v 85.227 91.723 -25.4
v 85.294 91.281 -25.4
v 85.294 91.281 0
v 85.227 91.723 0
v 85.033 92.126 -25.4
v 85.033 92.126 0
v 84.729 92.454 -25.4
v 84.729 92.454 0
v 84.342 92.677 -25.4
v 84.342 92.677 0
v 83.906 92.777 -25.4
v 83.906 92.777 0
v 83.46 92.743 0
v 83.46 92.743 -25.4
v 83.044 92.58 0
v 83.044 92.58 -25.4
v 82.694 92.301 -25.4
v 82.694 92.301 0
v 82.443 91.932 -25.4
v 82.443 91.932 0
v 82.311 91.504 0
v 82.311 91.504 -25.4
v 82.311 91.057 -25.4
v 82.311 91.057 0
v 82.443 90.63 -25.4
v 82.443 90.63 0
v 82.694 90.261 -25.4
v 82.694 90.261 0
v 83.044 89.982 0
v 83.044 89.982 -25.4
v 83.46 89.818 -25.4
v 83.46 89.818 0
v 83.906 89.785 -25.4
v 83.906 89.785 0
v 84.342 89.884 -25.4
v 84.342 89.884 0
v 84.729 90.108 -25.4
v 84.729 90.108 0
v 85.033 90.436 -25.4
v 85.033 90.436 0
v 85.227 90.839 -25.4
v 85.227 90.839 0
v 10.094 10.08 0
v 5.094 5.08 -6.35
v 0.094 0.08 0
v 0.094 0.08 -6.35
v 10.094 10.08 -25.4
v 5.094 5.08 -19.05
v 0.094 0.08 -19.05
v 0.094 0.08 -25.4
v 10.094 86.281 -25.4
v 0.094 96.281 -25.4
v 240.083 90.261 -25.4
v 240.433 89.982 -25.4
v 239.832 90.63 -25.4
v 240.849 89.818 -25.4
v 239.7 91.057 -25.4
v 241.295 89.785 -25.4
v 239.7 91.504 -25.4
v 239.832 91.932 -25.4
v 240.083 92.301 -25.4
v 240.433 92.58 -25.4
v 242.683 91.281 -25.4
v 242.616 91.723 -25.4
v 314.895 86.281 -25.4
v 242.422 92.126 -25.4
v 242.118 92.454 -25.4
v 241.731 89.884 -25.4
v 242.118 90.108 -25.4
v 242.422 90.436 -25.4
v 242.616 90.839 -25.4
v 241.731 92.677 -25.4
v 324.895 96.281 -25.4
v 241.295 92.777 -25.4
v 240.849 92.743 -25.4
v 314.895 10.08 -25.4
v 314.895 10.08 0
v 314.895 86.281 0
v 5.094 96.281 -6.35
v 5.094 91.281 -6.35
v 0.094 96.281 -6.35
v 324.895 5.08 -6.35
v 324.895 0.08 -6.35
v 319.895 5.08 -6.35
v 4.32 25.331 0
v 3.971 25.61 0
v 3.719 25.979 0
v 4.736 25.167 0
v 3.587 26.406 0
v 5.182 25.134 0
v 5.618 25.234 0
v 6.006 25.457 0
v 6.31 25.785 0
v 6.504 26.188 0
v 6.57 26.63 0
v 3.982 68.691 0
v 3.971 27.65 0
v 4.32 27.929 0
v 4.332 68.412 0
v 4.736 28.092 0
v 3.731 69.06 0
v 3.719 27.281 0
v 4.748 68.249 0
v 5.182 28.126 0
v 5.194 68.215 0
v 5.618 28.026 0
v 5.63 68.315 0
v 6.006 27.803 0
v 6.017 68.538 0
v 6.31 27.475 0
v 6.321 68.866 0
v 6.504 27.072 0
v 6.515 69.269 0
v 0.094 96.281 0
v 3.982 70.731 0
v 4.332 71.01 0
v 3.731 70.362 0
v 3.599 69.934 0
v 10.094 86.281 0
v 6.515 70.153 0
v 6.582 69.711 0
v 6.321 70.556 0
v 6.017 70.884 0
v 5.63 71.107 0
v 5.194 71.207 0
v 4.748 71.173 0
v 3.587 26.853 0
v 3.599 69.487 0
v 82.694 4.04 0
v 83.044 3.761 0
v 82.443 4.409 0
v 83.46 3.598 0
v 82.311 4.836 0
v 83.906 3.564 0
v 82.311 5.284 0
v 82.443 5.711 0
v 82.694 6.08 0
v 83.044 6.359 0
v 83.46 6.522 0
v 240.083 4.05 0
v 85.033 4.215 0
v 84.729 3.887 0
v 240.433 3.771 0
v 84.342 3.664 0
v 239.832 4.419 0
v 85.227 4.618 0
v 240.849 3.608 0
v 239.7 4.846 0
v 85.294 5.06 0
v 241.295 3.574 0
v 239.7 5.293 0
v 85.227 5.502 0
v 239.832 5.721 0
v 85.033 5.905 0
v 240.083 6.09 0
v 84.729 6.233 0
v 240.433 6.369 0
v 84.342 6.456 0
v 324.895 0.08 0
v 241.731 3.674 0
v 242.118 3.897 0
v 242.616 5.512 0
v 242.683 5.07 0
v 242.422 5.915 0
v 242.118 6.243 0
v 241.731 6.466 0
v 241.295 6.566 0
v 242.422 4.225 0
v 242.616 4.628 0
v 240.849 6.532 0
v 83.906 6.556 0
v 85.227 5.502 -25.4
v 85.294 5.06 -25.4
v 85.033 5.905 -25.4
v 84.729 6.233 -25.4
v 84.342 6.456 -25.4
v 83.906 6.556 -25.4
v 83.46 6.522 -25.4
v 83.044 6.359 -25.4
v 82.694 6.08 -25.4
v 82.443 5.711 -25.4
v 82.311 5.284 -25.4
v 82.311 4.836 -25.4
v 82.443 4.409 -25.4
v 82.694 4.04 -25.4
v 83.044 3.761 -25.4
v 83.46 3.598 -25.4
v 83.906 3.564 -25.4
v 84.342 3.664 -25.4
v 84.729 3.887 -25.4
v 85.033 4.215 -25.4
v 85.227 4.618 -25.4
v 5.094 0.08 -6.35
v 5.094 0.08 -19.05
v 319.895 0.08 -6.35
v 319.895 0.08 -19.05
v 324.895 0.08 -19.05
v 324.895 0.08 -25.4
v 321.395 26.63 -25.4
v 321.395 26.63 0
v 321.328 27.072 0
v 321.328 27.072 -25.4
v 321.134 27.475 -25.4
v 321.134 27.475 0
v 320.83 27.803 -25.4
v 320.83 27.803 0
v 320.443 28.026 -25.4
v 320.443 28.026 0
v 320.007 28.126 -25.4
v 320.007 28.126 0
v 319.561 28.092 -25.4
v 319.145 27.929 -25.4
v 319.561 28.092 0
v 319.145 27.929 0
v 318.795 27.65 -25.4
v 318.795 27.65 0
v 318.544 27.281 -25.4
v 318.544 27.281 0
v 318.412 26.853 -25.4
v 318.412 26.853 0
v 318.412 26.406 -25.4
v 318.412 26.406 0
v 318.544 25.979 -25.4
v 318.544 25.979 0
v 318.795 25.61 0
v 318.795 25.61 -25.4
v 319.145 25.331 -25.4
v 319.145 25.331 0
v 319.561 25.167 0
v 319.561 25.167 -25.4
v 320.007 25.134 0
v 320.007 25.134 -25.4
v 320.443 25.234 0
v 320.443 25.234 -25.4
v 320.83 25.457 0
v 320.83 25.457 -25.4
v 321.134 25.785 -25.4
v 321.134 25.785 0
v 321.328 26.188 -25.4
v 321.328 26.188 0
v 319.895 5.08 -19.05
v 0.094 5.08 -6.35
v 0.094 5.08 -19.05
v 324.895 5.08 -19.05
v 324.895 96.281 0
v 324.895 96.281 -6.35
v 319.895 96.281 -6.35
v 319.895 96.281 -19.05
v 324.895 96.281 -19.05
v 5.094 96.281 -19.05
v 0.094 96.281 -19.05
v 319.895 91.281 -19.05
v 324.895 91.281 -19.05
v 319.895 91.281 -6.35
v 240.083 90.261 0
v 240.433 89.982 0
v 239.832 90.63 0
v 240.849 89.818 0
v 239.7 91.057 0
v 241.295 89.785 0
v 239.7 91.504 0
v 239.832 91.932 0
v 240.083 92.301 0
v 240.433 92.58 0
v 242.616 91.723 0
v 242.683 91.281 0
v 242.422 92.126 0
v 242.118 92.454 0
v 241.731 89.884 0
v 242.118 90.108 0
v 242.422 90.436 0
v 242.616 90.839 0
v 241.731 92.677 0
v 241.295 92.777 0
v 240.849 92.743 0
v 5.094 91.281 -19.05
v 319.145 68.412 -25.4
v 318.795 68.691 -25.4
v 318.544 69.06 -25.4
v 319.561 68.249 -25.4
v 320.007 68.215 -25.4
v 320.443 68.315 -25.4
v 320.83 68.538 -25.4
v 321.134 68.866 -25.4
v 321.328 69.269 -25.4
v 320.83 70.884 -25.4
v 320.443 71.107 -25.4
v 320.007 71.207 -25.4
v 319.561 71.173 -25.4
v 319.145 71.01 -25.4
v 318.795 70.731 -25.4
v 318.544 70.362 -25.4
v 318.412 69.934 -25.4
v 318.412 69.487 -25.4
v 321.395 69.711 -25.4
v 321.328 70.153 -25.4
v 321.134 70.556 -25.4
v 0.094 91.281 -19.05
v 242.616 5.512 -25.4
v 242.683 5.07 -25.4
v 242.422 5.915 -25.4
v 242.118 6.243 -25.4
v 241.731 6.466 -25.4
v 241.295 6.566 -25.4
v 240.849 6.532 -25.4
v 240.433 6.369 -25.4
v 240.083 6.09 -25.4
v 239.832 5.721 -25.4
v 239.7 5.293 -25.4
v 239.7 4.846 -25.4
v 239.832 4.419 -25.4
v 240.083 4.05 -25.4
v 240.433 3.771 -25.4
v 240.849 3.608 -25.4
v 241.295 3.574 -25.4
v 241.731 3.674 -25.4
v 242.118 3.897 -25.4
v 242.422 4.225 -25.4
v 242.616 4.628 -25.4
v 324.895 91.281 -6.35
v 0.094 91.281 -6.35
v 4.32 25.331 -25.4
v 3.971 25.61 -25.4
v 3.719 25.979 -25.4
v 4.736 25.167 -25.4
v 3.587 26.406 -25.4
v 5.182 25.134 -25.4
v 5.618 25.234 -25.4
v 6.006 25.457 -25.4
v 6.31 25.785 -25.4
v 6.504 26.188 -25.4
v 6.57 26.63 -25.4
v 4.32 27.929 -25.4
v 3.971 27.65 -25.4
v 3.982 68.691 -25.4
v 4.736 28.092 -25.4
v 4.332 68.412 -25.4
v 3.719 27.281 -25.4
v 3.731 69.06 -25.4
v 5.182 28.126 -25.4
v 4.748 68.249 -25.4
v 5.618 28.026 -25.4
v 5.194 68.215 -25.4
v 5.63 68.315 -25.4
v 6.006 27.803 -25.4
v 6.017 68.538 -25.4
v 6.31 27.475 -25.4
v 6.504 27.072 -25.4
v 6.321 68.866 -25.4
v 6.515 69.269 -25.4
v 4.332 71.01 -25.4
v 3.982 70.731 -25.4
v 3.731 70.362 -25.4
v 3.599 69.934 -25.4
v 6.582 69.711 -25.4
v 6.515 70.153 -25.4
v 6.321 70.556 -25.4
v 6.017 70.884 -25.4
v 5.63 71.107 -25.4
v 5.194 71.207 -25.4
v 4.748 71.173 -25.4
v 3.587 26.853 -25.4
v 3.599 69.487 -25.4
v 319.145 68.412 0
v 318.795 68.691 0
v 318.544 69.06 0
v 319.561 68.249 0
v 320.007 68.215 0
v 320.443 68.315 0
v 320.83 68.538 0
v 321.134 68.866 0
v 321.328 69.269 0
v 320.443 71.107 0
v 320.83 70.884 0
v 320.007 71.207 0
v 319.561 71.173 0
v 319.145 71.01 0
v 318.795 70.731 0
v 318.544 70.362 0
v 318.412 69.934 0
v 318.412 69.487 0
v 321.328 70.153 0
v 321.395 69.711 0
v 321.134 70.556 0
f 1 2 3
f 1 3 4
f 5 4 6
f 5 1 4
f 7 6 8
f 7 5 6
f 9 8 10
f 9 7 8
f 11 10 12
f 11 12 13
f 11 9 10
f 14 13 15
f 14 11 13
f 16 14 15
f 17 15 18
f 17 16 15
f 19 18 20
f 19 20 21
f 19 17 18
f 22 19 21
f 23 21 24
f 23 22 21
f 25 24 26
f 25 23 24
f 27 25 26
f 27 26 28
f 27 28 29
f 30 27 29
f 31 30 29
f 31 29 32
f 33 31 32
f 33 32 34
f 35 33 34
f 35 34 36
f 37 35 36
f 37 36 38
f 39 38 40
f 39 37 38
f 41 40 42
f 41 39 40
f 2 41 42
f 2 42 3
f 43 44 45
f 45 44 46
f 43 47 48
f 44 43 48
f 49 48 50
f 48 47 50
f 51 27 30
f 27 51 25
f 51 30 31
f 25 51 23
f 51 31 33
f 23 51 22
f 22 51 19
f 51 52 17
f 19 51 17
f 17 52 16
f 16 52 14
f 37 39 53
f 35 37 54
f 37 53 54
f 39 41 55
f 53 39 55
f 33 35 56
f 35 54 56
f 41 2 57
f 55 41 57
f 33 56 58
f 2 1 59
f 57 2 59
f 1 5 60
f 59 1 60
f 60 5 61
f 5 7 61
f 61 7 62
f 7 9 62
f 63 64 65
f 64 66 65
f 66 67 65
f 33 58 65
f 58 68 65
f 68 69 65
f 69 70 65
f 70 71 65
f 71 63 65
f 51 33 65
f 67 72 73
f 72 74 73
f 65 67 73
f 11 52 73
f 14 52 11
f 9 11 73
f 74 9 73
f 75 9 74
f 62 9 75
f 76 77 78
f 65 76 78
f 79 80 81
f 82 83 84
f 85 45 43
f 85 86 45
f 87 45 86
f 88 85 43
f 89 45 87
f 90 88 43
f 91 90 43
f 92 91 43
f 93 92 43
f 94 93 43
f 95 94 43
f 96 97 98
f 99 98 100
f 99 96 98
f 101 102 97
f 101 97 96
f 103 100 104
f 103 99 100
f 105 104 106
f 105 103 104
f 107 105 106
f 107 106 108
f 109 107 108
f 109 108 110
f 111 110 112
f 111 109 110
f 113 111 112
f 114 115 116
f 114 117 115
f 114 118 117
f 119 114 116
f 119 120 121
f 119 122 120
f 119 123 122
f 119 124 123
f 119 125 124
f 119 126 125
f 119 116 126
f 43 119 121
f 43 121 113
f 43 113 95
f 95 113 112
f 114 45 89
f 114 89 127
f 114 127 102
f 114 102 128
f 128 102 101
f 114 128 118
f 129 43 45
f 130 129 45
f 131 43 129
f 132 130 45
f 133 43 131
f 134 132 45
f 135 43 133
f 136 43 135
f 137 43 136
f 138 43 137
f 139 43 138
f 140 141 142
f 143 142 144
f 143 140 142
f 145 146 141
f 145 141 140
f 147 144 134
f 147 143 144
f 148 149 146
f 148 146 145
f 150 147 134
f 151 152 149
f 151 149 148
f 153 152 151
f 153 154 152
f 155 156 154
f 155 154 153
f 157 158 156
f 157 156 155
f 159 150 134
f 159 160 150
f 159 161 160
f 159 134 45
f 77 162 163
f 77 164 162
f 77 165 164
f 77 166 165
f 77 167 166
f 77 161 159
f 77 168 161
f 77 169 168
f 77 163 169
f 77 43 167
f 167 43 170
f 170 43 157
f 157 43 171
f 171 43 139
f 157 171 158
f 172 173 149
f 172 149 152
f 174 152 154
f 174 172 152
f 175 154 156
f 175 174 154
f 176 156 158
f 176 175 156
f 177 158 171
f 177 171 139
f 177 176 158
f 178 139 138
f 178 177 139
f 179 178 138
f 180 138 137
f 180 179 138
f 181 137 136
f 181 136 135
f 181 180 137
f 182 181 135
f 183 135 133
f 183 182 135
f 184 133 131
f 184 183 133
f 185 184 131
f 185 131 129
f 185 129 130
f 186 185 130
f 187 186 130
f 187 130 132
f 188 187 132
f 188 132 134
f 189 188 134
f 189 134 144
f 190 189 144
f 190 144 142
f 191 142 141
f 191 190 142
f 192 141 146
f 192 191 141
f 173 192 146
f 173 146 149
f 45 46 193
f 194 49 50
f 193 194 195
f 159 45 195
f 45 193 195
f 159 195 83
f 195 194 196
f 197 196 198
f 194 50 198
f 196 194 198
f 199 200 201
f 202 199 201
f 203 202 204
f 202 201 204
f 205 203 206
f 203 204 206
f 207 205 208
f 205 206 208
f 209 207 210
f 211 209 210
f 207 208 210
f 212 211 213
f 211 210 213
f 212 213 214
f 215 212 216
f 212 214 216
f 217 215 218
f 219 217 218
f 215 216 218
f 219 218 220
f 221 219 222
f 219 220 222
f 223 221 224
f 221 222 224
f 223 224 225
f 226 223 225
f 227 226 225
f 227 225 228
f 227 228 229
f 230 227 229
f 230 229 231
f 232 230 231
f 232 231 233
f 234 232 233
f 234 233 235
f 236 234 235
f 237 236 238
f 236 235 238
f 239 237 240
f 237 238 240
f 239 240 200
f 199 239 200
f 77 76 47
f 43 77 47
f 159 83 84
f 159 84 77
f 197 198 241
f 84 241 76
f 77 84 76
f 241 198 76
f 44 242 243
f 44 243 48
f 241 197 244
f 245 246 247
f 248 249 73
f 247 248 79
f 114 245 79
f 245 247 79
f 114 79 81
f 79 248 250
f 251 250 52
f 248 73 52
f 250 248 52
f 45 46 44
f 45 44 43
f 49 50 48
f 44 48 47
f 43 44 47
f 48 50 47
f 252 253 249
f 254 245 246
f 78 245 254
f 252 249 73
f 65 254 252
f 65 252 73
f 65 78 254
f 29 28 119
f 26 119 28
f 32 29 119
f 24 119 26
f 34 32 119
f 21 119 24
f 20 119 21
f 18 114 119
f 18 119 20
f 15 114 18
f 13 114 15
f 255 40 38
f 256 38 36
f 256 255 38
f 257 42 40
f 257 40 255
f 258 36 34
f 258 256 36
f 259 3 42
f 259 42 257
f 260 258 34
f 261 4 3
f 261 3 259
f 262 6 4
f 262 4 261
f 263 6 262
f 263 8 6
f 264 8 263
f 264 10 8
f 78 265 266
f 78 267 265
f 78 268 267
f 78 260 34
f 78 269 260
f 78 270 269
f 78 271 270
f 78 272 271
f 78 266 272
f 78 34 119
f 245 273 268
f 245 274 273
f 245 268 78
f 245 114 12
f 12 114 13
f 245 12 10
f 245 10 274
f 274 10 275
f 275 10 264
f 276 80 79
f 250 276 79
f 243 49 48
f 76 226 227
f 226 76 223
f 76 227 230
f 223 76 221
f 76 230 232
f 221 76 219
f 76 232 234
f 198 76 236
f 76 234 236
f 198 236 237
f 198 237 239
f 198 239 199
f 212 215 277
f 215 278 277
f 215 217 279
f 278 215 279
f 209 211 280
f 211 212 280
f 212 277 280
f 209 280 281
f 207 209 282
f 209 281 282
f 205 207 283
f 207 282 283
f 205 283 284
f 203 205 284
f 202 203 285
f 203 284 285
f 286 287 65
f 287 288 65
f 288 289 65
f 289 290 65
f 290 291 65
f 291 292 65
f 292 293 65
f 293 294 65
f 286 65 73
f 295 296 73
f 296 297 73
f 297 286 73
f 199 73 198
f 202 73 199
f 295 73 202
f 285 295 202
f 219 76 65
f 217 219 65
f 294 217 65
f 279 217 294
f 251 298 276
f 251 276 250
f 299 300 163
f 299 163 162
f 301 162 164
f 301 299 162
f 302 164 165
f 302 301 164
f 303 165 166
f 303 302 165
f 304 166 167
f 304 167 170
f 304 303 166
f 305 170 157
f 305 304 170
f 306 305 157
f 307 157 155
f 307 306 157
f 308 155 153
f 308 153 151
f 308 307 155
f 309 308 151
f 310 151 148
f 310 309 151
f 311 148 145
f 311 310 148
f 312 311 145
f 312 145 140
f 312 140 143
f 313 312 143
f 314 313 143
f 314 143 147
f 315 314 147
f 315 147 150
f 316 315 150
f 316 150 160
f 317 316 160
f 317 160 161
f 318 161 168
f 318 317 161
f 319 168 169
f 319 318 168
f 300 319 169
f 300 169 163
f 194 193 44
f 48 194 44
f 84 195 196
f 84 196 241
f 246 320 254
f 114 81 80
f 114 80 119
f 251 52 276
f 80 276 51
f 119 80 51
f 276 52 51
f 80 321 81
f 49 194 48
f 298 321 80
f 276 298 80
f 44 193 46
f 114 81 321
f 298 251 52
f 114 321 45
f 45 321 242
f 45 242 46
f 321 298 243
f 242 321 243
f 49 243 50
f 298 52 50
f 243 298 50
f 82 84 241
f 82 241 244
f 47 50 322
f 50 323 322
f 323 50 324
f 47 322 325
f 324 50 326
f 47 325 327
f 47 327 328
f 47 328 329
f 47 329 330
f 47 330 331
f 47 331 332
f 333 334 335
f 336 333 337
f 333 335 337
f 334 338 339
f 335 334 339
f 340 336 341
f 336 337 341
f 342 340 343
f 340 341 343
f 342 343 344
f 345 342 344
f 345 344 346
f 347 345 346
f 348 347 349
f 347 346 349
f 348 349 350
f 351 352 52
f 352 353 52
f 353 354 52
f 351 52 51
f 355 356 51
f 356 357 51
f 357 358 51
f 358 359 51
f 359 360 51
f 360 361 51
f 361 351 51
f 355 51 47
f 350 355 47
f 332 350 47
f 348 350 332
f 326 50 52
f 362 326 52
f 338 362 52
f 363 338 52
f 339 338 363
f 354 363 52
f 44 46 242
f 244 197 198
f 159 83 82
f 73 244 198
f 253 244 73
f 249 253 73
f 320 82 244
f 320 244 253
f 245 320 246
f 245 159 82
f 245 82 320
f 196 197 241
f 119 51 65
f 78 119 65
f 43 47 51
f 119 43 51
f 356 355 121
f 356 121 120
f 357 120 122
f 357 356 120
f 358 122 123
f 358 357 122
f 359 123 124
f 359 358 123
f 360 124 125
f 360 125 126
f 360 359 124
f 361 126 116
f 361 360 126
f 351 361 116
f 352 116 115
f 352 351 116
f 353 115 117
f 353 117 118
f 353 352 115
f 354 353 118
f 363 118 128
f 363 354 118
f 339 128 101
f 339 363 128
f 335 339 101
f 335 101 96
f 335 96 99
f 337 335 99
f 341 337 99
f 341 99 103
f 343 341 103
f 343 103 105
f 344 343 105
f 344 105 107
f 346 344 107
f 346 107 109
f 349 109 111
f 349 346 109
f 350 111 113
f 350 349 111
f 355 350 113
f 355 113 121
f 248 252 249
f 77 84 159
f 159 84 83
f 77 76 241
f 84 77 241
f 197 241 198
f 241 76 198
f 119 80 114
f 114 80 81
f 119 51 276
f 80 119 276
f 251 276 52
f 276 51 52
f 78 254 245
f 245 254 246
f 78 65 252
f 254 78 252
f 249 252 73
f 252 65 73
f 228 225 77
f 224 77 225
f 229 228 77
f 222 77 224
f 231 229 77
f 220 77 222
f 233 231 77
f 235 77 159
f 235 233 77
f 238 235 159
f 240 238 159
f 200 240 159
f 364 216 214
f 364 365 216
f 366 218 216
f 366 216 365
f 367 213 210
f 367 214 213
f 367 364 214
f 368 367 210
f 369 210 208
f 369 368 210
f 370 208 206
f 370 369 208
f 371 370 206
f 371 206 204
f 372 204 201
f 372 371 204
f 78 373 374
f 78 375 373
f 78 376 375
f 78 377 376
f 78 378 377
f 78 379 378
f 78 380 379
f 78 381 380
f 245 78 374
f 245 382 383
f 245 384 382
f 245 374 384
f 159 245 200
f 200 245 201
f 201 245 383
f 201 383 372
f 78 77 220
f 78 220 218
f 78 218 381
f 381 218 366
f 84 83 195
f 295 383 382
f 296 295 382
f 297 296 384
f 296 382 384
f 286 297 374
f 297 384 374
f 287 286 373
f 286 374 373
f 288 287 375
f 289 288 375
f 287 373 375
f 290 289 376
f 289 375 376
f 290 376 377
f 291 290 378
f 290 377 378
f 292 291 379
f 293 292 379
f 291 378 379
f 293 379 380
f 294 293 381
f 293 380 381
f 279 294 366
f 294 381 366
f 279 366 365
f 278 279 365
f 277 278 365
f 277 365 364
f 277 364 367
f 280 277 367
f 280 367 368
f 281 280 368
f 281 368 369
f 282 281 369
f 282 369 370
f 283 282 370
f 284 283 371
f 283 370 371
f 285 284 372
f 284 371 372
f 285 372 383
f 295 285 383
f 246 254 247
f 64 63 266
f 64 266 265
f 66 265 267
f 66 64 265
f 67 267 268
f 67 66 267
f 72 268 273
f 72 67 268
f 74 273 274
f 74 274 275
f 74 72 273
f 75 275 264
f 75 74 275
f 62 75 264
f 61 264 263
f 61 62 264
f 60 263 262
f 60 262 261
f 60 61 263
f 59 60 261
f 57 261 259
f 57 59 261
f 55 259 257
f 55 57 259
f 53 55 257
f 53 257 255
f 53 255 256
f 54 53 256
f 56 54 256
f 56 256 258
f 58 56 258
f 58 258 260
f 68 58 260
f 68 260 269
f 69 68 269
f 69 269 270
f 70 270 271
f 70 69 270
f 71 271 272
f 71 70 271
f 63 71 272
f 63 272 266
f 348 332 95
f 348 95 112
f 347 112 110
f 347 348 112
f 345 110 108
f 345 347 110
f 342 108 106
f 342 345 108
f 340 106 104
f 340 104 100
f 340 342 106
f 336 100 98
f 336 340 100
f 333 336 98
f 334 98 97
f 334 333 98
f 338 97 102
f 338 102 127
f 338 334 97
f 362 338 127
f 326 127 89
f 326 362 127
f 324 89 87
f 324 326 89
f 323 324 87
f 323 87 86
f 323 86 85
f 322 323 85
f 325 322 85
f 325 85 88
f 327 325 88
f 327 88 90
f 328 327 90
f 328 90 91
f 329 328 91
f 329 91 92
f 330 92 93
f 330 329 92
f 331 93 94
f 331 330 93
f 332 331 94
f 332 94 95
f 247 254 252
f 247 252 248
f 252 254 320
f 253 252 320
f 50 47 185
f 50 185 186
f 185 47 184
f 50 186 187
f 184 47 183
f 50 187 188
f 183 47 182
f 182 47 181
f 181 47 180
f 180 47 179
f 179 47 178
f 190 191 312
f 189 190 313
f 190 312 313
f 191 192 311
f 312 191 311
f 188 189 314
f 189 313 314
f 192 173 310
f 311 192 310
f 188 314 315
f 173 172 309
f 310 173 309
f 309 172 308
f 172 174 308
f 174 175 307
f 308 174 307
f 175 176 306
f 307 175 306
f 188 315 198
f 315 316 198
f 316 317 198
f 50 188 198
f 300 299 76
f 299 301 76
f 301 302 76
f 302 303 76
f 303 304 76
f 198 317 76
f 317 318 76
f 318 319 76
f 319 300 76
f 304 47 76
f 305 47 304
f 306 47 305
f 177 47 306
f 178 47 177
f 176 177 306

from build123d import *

# Parameters (mm, degrees)
SKETCH1_W               = 324.8012934
SKETCH1_H               = 96.2008736
SKETCH1_W_2             = 304.8012934
SKETCH1_H_2             = 76.2008736
BOSS_EXTRUDE1_DEPTH     = 25.4
SKETCH2_R               = 1.5
CUT_EXTRUDE1_DEPTH      = 25.4
SPLIT1_START            = -1
SPLIT1_OUTLINE_W        = 231.654651096
SPLIT1_OUTLINE_H        = 25.4
SPLIT1_DEPTH            = 300
SPLIT1_START_2          = 122.296599373
SPLIT1_2_OUTLINE_W      = 69.345348904
SPLIT1_2_OUTLINE_H      = 25.4
SPLIT1_2_DEPTH          = 107.4953748
SPLIT1_START_3          = -25.4
SPLIT1_3_OUTLINE_R      = 1.5
SPLIT1_3_DEPTH          = 25.4
SPLIT1_4_OUTLINE_R      = 1.5
SPLIT1_4_DEPTH          = 25.4
SPLIT1_5_DEPTH          = 25.4
SPLIT1_6_OUTLINE_R      = 1.5
SPLIT1_6_DEPTH          = 25.4
SPLIT1_7_OUTLINE_R      = 1.5
SPLIT1_7_DEPTH          = 25.4
SPLIT1_8_DEPTH          = 25.4
SPLIT1_9_OUTLINE_R      = 1.5
SPLIT1_9_DEPTH          = 25.4
CUT_EXTRUDE2_DEPTH      = 6.35
CUT_EXTRUDE2_DEPTH_BACK = 6.35
SKETCH5_W               = 5
SKETCH5_H               = 5


with BuildPart() as part:
    # Sketch1 → Boss-Extrude1 (new body)
    with BuildSketch(Plane.XY):
        with Locations((162.4943533, 48.1803632)):
            Rectangle(SKETCH1_W, SKETCH1_H)
        with Locations((162.4943533, 48.1803632)):
            Rectangle(SKETCH1_W_2, SKETCH1_H_2, mode=Mode.SUBTRACT)
    extrude(amount=-BOSS_EXTRUDE1_DEPTH)

    # Sketch2 → Cut-Extrude1 (cut)
    with BuildSketch(Plane.XY):
        with Locations((83.79402995, 91.2808)):
            Circle(SKETCH2_R)
        with Locations((241.182963325, 91.2808)):
            Circle(SKETCH2_R)
        with Locations((319.895, 69.710908993)):
            Circle(SKETCH2_R)
        with Locations((319.895, 26.629837247)):
            Circle(SKETCH2_R)
        with Locations((241.182963325, 5.0699356)):
            Circle(SKETCH2_R)
        with Locations((83.79402995, 5.0599448)):
            Circle(SKETCH2_R)
        with Locations((5.07026943, 26.629837247)):
            Circle(SKETCH2_R)
        with Locations((5.081988015, 69.710908993)):
            Circle(SKETCH2_R)
    extrude(amount=-CUT_EXTRUDE1_DEPTH, mode=Mode.SUBTRACT)

    # Split1: read off the stored shape, not the designer's step
    # Split1 outline → Split1 (cut)
    with BuildSketch(Plane(origin=(0, 0, 0), x_dir=(0.707106781186548, -0.707106781186547, 0), z_dir=(0.707106781186547, 0.707106781186548, 0)).offset(SPLIT1_START)):
        with Locations((45.827325548, 12.7)):
            Rectangle(SPLIT1_OUTLINE_W, SPLIT1_OUTLINE_H)
    extrude(amount=SPLIT1_DEPTH, mode=Mode.SUBTRACT)

    # Split1 2 outline → Split1 2 (cut)
    with BuildSketch(Plane(origin=(0, 0, 0), x_dir=(0.707106781186548, -0.707106781186547, 0), z_dir=(0.707106781186547, 0.707106781186548, 0)).offset(SPLIT1_START_2)):
        with Locations((196.327325548, 12.7)):
            Rectangle(SPLIT1_2_OUTLINE_W, SPLIT1_2_OUTLINE_H)
    extrude(amount=SPLIT1_2_DEPTH, mode=Mode.SUBTRACT)


with BuildPart() as body_2:
    # Split1 3 outline → Split1 3 (new body)
    with BuildSketch(Plane.XY.offset(SPLIT1_START_3)):
        Polygon((0.0937066, 0.0799264), (10.0937066, 10.0799264), (10.0937066, 86.2808), (0.0937066, 96.2808), align=None)
        with Locations((5.07026943, 26.629837247)):
            Circle(SPLIT1_3_OUTLINE_R, mode=Mode.SUBTRACT)
        with Locations((5.081988015, 69.710908993)):
            Circle(SPLIT1_3_OUTLINE_R, mode=Mode.SUBTRACT)
    extrude(amount=SPLIT1_3_DEPTH)


with BuildPart() as body_3:
    # Split1 4 outline → Split1 4 (new body)
    with BuildSketch(Plane.XY.offset(SPLIT1_START_3)):
        Polygon((324.895, 0.0799264), (314.895, 10.0799264), (238.6941264, 10.0799264), (228.6941264, 0.0799264), align=None)
        with Locations((241.182963325, 5.0699356)):
            Circle(SPLIT1_4_OUTLINE_R, mode=Mode.SUBTRACT)
    extrude(amount=SPLIT1_4_DEPTH)


with BuildPart() as body_4:
    # Split1 5 outline → Split1 5 (new body)
    with BuildSketch(Plane.XY.offset(SPLIT1_START_3)):
        Polygon((228.6941264, 0.0799264), (238.6941264, 10.0799264), (86.2945802, 10.0799264), (96.2945802, 0.0799264), align=None)
    extrude(amount=SPLIT1_5_DEPTH)


with BuildPart() as body_5:
    # Split1 6 outline → Split1 6 (new body)
    with BuildSketch(Plane.XY.offset(SPLIT1_START_3)):
        Polygon((96.2945802, 0.0799264), (86.2945802, 10.0799264), (10.0937066, 10.0799264), (0.0937066, 0.0799264), align=None)
        with Locations((83.79402995, 5.0599448)):
            Circle(SPLIT1_6_OUTLINE_R, mode=Mode.SUBTRACT)
    extrude(amount=SPLIT1_6_DEPTH)


with BuildPart() as body_6:
    # Split1 7 outline → Split1 7 (new body)
    with BuildSketch(Plane.XY.offset(SPLIT1_START_3)):
        Polygon((314.895, 86.2808), (324.895, 96.2808), (228.6941264, 96.2808), (238.6941264, 86.2808), align=None)
        with Locations((241.182963325, 91.2808)):
            Circle(SPLIT1_7_OUTLINE_R, mode=Mode.SUBTRACT)
    extrude(amount=SPLIT1_7_DEPTH)


with BuildPart() as body_7:
    # Split1 8 outline → Split1 8 (new body)
    with BuildSketch(Plane.XY.offset(SPLIT1_START_3)):
        Polygon((238.6941264, 86.2808), (228.6941264, 96.2808), (96.2945802, 96.2808), (86.2945802, 86.2808), align=None)
    extrude(amount=SPLIT1_8_DEPTH)


with BuildPart() as body_8:
    # Split1 9 outline → Split1 9 (new body)
    with BuildSketch(Plane.XY.offset(SPLIT1_START_3)):
        Polygon((86.2945802, 86.2808), (96.2945802, 96.2808), (0.0937066, 96.2808), (10.0937066, 86.2808), align=None)
        with Locations((83.79402995, 91.2808)):
            Circle(SPLIT1_9_OUTLINE_R, mode=Mode.SUBTRACT)
    extrude(amount=SPLIT1_9_DEPTH)

    # Combine1: union body 7, body 6
    add(body_7.part)
    add(body_6.part)


with BuildPart() as body_4_1:
    add(body_4.part)

    # Combine2: read off the stored shape, not the designer's step
    # Combine2: union body 3, body 5
    add(body_3.part)
    add(body_5.part)


with BuildPart() as cut_extrude2_tool:
    # Sketch5 → Cut-Extrude2 (new, two sides: drawn at the far end of the back side and taken through both)
    with BuildSketch(Plane.YX.offset(12.7).offset(-CUT_EXTRUDE2_DEPTH_BACK)):
        with Locations((2.5799264, 322.395)):
            Rectangle(SKETCH5_W, SKETCH5_H)
        with Locations((2.5799264, 2.5937066)):
            Rectangle(SKETCH5_W, SKETCH5_H)
        with Locations((93.7808, 2.5937066)):
            Rectangle(SKETCH5_W, SKETCH5_H)
        with Locations((93.7808, 322.395)):
            Rectangle(SKETCH5_W, SKETCH5_H)
    extrude(amount=CUT_EXTRUDE2_DEPTH + CUT_EXTRUDE2_DEPTH_BACK)


with BuildPart() as part_1:
    add(part.part)

    # Cut-Extrude2: cut by cut_extrude2_tool
    add(cut_extrude2_tool.part, mode=Mode.SUBTRACT)


with BuildPart() as body_2_1:
    add(body_2.part)

    # Cut-Extrude2: cut by cut_extrude2_tool
    add(cut_extrude2_tool.part, mode=Mode.SUBTRACT)


with BuildPart() as body_4_2:
    add(body_4_1.part)

    # Cut-Extrude2: cut by cut_extrude2_tool
    add(cut_extrude2_tool.part, mode=Mode.SUBTRACT)


with BuildPart() as body_8_1:
    add(body_8.part)

    # Cut-Extrude2: cut by cut_extrude2_tool
    add(cut_extrude2_tool.part, mode=Mode.SUBTRACT)


solid = Compound([part_1.part, body_2_1.part, body_4_2.part, body_8_1.part])
